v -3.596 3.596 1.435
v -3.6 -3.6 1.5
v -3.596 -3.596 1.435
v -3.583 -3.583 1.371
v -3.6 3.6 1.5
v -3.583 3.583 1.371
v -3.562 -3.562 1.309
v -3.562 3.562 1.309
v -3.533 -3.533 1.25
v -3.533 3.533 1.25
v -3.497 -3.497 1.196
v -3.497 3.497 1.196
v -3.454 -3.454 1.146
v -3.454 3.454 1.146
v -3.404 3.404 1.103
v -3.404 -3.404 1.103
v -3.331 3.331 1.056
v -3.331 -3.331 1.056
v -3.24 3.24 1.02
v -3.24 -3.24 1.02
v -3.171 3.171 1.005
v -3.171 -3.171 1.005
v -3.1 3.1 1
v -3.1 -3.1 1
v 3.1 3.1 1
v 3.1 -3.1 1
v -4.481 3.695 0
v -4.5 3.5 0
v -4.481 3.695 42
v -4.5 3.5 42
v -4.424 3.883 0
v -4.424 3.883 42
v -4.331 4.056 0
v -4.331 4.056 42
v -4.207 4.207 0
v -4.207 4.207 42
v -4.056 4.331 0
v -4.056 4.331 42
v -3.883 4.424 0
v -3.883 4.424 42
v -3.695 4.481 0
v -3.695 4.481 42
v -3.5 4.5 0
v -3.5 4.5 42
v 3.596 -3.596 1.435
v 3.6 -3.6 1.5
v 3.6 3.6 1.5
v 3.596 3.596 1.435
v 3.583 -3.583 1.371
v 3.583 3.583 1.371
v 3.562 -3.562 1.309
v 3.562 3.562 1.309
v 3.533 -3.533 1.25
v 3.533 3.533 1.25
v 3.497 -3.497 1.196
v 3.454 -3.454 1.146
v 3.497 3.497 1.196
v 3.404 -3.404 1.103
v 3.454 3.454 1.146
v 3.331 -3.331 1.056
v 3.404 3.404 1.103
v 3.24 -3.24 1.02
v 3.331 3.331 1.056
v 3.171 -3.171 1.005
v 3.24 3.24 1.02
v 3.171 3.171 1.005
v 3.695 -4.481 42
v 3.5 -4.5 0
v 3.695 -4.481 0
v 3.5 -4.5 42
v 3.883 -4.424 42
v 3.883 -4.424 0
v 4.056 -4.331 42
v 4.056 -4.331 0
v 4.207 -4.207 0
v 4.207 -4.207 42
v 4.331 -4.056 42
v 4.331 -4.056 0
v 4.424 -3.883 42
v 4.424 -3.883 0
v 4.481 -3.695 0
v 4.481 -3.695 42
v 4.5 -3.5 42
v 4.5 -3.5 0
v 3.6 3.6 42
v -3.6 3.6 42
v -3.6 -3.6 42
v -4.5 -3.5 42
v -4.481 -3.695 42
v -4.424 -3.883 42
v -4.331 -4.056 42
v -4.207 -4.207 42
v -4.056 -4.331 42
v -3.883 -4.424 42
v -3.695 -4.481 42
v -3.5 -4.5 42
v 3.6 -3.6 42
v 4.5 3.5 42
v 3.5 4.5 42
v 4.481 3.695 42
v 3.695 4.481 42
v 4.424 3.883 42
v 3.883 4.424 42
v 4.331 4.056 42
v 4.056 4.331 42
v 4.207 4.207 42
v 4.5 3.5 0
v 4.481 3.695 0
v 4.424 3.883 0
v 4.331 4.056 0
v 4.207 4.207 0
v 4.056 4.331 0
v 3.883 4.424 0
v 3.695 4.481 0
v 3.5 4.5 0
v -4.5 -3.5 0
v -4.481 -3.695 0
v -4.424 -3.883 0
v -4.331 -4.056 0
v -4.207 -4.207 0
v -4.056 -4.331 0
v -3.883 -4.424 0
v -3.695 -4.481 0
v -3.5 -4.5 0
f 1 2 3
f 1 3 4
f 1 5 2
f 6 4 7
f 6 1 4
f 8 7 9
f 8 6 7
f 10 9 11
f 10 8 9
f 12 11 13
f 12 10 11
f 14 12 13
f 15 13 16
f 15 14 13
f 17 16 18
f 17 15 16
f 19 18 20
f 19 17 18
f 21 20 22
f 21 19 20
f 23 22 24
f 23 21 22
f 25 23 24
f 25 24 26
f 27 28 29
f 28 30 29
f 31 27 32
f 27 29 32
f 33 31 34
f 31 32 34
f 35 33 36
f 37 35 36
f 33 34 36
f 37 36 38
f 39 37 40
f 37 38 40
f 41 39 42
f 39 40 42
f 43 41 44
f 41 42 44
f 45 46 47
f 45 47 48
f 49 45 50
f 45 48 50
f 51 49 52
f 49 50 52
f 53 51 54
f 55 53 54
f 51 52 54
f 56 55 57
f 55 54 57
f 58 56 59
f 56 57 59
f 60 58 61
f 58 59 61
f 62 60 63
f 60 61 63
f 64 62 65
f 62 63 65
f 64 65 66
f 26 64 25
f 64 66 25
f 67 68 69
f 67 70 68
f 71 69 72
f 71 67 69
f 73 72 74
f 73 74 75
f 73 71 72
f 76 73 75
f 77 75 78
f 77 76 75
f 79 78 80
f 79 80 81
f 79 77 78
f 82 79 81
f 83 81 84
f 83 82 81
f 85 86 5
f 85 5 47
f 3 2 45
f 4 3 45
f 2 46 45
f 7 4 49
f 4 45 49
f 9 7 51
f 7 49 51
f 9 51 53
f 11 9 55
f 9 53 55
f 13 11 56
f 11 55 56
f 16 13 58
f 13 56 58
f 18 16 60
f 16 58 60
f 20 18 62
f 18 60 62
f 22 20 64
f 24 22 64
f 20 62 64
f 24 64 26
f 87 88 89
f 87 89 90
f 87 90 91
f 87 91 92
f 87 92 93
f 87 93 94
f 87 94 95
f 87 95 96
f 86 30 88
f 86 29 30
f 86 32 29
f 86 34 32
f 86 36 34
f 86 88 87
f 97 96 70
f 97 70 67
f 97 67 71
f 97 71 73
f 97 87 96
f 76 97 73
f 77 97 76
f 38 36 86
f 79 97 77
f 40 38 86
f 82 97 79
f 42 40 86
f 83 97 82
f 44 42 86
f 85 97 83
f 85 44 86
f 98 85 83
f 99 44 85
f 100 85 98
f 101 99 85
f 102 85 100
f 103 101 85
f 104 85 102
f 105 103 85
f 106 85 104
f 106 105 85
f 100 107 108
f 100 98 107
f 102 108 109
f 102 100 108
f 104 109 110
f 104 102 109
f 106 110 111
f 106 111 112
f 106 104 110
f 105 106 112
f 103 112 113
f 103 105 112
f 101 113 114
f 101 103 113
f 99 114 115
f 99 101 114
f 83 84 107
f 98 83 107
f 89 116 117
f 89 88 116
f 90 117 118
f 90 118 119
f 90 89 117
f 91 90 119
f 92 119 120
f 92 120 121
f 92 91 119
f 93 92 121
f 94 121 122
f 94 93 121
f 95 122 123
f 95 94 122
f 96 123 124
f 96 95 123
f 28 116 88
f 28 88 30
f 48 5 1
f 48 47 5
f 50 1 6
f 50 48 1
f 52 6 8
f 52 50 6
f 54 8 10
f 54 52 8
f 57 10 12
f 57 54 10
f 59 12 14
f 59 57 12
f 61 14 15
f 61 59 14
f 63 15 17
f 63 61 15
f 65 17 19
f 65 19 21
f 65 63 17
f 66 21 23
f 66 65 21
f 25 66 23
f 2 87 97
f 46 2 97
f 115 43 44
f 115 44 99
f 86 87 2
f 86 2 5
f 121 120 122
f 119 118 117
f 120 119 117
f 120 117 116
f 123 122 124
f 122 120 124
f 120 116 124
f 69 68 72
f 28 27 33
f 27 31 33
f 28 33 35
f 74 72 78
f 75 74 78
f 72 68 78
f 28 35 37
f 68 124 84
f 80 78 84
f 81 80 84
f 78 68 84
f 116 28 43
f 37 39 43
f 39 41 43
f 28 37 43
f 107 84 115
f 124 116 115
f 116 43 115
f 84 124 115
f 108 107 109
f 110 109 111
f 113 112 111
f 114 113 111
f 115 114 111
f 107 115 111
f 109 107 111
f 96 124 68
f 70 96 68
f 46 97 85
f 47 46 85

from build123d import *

# Parameters (mm, degrees)
F0_W     = 9
F0_H     = 9
F1_DEPTH = 42
F2_R     = 1
F3_W     = 7.2
F3_H     = 7.2
F4_DEPTH = 41
F5_R     = 0.5


with BuildPart() as f1:
    # F0 (on Top) → F1 (new body)
    with BuildSketch(Plane.XY):
        Rectangle(F0_W, F0_H)
    extrude(amount=F1_DEPTH)

    # F2
    f2_edges = [f1.edges().sort_by_distance(p)[0] for p in [
        (-4.5, -4.5, 21),
        (4.5, -4.5, 21),
        (4.5, 4.5, 21),
        (-4.5, 4.5, 21),
    ]]
    fillet(f2_edges, radius=F2_R)

    # F3 (on face) → F4 (cut)
    with BuildSketch(Plane.XY.offset(42)):
        Rectangle(F3_W, F3_H)
    extrude(amount=-F4_DEPTH, mode=Mode.SUBTRACT)

    # F5
    f5_edges = [f1.edges().sort_by_distance(p)[0] for p in [
        (0, 3.6, 1),
        (-3.6, 0, 1),
        (3.6, 0, 1),
        (0, -3.6, 1),
    ]]
    fillet(f5_edges, radius=F5_R)


solid = f1.part
